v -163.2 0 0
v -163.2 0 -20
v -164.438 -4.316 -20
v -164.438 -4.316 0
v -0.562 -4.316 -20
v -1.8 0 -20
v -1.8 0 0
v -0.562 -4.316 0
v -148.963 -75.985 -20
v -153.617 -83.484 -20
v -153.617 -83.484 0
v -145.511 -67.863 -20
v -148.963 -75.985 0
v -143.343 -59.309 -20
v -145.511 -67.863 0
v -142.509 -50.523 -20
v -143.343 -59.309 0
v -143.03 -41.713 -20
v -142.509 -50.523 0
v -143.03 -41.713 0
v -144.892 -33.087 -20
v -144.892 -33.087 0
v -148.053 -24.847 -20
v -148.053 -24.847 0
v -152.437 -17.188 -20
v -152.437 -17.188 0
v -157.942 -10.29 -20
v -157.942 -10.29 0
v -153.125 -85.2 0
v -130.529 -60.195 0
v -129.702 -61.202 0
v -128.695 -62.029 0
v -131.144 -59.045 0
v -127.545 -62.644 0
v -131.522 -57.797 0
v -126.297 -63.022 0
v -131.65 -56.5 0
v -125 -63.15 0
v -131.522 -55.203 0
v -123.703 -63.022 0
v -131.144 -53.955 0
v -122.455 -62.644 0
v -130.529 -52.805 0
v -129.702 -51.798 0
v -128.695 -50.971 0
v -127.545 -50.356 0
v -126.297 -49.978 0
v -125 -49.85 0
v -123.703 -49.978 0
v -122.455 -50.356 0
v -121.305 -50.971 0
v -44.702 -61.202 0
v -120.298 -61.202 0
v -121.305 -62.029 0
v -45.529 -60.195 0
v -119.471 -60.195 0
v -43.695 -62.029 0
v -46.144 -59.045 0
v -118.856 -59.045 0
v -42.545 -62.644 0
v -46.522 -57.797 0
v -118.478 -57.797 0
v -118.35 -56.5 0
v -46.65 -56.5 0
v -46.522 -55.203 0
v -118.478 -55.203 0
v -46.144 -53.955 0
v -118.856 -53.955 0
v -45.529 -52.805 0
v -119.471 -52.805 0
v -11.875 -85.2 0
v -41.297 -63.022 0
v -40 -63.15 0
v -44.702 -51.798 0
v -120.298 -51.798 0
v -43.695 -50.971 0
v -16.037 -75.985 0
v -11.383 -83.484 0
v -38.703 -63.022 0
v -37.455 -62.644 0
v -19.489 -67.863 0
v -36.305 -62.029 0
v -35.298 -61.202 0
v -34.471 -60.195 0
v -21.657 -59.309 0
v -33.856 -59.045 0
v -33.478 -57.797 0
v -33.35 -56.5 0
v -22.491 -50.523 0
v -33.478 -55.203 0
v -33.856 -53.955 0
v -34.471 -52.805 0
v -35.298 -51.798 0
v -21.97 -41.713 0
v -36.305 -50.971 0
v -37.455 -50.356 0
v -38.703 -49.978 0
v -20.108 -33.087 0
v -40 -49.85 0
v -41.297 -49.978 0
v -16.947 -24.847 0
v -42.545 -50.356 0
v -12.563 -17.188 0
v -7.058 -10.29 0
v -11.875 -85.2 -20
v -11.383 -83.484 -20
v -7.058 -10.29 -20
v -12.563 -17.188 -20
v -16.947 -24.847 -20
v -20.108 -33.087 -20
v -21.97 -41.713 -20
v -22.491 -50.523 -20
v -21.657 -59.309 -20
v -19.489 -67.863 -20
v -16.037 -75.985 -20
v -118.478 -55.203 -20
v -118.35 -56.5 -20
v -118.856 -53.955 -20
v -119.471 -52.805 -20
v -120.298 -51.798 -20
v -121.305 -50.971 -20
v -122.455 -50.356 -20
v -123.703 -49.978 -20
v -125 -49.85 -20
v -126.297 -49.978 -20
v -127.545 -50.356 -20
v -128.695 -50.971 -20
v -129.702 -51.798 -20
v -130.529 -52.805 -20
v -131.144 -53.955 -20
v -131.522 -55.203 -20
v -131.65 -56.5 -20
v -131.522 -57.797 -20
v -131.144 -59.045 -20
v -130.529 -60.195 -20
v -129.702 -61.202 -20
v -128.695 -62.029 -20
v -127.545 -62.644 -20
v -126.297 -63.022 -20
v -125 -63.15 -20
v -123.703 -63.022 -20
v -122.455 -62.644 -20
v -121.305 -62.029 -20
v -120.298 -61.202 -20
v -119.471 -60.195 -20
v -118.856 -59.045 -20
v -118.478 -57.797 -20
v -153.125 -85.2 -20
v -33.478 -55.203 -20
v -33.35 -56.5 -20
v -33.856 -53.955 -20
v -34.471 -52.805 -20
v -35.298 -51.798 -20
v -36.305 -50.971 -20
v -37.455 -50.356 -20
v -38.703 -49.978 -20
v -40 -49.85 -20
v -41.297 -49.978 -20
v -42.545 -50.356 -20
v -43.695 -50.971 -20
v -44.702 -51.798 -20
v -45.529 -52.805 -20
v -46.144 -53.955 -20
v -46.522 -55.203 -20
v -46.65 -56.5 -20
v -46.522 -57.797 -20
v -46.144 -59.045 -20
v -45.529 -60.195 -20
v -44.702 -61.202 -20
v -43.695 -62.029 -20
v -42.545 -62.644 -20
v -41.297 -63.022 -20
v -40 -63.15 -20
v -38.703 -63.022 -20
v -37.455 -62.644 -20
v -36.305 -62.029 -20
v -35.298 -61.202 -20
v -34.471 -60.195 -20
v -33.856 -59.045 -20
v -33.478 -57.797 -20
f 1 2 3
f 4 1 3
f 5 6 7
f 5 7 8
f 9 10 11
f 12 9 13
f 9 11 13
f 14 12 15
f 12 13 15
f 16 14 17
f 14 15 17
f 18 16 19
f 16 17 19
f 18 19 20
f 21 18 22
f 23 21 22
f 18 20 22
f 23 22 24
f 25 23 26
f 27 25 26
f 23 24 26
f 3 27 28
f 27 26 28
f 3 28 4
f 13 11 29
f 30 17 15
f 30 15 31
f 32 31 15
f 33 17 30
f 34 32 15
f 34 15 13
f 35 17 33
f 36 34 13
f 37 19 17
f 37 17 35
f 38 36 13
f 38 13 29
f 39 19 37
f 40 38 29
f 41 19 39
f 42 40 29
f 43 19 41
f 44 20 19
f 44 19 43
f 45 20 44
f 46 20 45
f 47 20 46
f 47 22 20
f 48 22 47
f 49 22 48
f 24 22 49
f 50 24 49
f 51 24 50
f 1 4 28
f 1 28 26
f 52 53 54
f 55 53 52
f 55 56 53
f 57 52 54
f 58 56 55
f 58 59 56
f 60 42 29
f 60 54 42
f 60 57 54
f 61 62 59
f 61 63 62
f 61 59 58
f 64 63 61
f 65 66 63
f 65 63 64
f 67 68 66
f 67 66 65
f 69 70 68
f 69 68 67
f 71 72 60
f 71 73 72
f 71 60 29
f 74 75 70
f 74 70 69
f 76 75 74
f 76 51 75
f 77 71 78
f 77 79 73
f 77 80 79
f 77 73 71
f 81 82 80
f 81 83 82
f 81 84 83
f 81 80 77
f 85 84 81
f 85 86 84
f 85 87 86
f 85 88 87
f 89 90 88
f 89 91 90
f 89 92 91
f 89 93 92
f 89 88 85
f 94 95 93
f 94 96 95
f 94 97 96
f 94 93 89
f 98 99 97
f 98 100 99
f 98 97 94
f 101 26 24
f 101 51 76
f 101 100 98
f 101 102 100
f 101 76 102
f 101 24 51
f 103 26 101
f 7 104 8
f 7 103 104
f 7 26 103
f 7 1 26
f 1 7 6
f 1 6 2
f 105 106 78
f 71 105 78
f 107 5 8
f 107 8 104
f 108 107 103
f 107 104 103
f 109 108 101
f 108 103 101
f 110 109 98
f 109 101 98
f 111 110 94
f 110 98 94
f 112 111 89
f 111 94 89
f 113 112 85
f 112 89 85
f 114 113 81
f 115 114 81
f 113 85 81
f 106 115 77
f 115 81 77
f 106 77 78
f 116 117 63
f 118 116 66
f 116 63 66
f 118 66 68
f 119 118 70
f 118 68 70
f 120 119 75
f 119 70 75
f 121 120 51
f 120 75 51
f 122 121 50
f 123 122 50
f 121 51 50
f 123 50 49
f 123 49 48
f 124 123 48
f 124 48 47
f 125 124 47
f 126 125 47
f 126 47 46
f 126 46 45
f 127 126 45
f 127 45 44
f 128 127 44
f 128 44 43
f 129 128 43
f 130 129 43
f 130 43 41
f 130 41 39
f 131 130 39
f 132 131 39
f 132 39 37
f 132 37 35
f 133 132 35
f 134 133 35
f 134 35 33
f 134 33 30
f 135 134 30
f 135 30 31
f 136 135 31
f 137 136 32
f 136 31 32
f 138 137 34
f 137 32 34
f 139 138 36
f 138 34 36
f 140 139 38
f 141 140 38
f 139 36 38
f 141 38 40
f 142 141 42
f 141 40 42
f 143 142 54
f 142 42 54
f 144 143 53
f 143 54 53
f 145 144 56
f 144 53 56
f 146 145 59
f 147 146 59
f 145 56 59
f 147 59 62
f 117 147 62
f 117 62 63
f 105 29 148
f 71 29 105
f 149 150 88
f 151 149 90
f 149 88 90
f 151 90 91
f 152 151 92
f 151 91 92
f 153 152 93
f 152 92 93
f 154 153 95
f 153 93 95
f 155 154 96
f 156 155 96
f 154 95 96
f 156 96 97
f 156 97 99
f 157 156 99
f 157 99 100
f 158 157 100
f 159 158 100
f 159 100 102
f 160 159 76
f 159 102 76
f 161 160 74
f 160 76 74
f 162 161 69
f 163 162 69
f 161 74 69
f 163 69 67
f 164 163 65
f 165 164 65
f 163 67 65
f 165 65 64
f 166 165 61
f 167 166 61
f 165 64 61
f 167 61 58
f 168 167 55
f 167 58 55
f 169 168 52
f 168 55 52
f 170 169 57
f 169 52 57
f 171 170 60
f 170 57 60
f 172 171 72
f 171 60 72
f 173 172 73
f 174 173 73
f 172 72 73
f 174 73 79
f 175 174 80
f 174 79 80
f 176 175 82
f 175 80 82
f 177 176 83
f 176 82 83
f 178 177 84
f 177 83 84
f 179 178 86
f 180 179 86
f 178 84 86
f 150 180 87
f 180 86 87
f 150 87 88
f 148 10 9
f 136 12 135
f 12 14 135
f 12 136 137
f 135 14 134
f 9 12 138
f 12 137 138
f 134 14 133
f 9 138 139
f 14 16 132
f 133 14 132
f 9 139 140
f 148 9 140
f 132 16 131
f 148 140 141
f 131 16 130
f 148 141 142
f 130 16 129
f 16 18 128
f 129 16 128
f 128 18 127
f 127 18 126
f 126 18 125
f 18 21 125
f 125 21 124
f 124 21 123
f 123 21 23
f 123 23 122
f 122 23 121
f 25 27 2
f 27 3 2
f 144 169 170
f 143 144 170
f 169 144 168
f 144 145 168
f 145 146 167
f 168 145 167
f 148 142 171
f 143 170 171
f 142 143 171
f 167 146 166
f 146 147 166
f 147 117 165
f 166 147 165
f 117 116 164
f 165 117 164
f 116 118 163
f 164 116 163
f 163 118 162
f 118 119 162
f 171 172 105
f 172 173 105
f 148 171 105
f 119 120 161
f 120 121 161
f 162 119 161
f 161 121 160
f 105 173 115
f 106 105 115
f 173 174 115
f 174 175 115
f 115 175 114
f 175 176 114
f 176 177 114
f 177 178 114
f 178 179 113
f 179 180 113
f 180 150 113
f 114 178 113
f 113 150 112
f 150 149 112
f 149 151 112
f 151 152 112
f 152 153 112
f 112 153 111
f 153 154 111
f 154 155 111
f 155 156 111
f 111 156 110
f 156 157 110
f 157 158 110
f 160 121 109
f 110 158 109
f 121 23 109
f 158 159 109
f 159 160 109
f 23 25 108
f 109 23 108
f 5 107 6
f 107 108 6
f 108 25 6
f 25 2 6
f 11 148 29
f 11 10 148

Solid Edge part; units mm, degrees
sketch "Sketch1" plane through (0, 0, 0) normal (0, 0, 1) x (1, 0, 0)
  line L0 (0, 0) -> (-165, 0)
  line L1 (-165, 0) -> (-165, -85.2)
  line L2 (-165, -85.2) -> (0, -85.2)
  line L3 (0, -85.2) -> (0, 0)
extrude "Protrusion1" add sketch "Sketch1" against normal blind 20
sketch "Sketch2" plane through (-82.5, -42.6, 0) normal (0, 0, 1) x (1, 0, 0)
  circle A0 centre (-42.5, -13.9) radius 6.65
  circle A1 centre (42.5, -13.9) radius 6.65
  circle A2 centre (-117.5, -6.9) radius 57.5
  circle A3 centre (117.5, -6.9) radius 57.5
extrude "ExtrudedCutout_1" cut sketch "Sketch2" against normal blind 20
chamfer "Chamfer_2" distance 1.8 angle 74 1 edges at (0, 0, -10) measured on face at (-25.85, 0, -16.4667)
chamfer "Chamfer_3" distance 1.8 angle 74 1 edges at (-165, 0, -10) measured on face at (-27.368, 0, -16.4667)
chamfer "Chamfer_4" distance 1.8 angle 74 1 edges at (-154.925, -85.2, -10) measured on face at (-132.2318, -85.2, -16.4667)
chamfer "Chamfer_5" distance 1.8 angle 74 1 edges at (-10.075, -85.2, -10) measured on face at (-130.7138, -85.2, -16.4667)
